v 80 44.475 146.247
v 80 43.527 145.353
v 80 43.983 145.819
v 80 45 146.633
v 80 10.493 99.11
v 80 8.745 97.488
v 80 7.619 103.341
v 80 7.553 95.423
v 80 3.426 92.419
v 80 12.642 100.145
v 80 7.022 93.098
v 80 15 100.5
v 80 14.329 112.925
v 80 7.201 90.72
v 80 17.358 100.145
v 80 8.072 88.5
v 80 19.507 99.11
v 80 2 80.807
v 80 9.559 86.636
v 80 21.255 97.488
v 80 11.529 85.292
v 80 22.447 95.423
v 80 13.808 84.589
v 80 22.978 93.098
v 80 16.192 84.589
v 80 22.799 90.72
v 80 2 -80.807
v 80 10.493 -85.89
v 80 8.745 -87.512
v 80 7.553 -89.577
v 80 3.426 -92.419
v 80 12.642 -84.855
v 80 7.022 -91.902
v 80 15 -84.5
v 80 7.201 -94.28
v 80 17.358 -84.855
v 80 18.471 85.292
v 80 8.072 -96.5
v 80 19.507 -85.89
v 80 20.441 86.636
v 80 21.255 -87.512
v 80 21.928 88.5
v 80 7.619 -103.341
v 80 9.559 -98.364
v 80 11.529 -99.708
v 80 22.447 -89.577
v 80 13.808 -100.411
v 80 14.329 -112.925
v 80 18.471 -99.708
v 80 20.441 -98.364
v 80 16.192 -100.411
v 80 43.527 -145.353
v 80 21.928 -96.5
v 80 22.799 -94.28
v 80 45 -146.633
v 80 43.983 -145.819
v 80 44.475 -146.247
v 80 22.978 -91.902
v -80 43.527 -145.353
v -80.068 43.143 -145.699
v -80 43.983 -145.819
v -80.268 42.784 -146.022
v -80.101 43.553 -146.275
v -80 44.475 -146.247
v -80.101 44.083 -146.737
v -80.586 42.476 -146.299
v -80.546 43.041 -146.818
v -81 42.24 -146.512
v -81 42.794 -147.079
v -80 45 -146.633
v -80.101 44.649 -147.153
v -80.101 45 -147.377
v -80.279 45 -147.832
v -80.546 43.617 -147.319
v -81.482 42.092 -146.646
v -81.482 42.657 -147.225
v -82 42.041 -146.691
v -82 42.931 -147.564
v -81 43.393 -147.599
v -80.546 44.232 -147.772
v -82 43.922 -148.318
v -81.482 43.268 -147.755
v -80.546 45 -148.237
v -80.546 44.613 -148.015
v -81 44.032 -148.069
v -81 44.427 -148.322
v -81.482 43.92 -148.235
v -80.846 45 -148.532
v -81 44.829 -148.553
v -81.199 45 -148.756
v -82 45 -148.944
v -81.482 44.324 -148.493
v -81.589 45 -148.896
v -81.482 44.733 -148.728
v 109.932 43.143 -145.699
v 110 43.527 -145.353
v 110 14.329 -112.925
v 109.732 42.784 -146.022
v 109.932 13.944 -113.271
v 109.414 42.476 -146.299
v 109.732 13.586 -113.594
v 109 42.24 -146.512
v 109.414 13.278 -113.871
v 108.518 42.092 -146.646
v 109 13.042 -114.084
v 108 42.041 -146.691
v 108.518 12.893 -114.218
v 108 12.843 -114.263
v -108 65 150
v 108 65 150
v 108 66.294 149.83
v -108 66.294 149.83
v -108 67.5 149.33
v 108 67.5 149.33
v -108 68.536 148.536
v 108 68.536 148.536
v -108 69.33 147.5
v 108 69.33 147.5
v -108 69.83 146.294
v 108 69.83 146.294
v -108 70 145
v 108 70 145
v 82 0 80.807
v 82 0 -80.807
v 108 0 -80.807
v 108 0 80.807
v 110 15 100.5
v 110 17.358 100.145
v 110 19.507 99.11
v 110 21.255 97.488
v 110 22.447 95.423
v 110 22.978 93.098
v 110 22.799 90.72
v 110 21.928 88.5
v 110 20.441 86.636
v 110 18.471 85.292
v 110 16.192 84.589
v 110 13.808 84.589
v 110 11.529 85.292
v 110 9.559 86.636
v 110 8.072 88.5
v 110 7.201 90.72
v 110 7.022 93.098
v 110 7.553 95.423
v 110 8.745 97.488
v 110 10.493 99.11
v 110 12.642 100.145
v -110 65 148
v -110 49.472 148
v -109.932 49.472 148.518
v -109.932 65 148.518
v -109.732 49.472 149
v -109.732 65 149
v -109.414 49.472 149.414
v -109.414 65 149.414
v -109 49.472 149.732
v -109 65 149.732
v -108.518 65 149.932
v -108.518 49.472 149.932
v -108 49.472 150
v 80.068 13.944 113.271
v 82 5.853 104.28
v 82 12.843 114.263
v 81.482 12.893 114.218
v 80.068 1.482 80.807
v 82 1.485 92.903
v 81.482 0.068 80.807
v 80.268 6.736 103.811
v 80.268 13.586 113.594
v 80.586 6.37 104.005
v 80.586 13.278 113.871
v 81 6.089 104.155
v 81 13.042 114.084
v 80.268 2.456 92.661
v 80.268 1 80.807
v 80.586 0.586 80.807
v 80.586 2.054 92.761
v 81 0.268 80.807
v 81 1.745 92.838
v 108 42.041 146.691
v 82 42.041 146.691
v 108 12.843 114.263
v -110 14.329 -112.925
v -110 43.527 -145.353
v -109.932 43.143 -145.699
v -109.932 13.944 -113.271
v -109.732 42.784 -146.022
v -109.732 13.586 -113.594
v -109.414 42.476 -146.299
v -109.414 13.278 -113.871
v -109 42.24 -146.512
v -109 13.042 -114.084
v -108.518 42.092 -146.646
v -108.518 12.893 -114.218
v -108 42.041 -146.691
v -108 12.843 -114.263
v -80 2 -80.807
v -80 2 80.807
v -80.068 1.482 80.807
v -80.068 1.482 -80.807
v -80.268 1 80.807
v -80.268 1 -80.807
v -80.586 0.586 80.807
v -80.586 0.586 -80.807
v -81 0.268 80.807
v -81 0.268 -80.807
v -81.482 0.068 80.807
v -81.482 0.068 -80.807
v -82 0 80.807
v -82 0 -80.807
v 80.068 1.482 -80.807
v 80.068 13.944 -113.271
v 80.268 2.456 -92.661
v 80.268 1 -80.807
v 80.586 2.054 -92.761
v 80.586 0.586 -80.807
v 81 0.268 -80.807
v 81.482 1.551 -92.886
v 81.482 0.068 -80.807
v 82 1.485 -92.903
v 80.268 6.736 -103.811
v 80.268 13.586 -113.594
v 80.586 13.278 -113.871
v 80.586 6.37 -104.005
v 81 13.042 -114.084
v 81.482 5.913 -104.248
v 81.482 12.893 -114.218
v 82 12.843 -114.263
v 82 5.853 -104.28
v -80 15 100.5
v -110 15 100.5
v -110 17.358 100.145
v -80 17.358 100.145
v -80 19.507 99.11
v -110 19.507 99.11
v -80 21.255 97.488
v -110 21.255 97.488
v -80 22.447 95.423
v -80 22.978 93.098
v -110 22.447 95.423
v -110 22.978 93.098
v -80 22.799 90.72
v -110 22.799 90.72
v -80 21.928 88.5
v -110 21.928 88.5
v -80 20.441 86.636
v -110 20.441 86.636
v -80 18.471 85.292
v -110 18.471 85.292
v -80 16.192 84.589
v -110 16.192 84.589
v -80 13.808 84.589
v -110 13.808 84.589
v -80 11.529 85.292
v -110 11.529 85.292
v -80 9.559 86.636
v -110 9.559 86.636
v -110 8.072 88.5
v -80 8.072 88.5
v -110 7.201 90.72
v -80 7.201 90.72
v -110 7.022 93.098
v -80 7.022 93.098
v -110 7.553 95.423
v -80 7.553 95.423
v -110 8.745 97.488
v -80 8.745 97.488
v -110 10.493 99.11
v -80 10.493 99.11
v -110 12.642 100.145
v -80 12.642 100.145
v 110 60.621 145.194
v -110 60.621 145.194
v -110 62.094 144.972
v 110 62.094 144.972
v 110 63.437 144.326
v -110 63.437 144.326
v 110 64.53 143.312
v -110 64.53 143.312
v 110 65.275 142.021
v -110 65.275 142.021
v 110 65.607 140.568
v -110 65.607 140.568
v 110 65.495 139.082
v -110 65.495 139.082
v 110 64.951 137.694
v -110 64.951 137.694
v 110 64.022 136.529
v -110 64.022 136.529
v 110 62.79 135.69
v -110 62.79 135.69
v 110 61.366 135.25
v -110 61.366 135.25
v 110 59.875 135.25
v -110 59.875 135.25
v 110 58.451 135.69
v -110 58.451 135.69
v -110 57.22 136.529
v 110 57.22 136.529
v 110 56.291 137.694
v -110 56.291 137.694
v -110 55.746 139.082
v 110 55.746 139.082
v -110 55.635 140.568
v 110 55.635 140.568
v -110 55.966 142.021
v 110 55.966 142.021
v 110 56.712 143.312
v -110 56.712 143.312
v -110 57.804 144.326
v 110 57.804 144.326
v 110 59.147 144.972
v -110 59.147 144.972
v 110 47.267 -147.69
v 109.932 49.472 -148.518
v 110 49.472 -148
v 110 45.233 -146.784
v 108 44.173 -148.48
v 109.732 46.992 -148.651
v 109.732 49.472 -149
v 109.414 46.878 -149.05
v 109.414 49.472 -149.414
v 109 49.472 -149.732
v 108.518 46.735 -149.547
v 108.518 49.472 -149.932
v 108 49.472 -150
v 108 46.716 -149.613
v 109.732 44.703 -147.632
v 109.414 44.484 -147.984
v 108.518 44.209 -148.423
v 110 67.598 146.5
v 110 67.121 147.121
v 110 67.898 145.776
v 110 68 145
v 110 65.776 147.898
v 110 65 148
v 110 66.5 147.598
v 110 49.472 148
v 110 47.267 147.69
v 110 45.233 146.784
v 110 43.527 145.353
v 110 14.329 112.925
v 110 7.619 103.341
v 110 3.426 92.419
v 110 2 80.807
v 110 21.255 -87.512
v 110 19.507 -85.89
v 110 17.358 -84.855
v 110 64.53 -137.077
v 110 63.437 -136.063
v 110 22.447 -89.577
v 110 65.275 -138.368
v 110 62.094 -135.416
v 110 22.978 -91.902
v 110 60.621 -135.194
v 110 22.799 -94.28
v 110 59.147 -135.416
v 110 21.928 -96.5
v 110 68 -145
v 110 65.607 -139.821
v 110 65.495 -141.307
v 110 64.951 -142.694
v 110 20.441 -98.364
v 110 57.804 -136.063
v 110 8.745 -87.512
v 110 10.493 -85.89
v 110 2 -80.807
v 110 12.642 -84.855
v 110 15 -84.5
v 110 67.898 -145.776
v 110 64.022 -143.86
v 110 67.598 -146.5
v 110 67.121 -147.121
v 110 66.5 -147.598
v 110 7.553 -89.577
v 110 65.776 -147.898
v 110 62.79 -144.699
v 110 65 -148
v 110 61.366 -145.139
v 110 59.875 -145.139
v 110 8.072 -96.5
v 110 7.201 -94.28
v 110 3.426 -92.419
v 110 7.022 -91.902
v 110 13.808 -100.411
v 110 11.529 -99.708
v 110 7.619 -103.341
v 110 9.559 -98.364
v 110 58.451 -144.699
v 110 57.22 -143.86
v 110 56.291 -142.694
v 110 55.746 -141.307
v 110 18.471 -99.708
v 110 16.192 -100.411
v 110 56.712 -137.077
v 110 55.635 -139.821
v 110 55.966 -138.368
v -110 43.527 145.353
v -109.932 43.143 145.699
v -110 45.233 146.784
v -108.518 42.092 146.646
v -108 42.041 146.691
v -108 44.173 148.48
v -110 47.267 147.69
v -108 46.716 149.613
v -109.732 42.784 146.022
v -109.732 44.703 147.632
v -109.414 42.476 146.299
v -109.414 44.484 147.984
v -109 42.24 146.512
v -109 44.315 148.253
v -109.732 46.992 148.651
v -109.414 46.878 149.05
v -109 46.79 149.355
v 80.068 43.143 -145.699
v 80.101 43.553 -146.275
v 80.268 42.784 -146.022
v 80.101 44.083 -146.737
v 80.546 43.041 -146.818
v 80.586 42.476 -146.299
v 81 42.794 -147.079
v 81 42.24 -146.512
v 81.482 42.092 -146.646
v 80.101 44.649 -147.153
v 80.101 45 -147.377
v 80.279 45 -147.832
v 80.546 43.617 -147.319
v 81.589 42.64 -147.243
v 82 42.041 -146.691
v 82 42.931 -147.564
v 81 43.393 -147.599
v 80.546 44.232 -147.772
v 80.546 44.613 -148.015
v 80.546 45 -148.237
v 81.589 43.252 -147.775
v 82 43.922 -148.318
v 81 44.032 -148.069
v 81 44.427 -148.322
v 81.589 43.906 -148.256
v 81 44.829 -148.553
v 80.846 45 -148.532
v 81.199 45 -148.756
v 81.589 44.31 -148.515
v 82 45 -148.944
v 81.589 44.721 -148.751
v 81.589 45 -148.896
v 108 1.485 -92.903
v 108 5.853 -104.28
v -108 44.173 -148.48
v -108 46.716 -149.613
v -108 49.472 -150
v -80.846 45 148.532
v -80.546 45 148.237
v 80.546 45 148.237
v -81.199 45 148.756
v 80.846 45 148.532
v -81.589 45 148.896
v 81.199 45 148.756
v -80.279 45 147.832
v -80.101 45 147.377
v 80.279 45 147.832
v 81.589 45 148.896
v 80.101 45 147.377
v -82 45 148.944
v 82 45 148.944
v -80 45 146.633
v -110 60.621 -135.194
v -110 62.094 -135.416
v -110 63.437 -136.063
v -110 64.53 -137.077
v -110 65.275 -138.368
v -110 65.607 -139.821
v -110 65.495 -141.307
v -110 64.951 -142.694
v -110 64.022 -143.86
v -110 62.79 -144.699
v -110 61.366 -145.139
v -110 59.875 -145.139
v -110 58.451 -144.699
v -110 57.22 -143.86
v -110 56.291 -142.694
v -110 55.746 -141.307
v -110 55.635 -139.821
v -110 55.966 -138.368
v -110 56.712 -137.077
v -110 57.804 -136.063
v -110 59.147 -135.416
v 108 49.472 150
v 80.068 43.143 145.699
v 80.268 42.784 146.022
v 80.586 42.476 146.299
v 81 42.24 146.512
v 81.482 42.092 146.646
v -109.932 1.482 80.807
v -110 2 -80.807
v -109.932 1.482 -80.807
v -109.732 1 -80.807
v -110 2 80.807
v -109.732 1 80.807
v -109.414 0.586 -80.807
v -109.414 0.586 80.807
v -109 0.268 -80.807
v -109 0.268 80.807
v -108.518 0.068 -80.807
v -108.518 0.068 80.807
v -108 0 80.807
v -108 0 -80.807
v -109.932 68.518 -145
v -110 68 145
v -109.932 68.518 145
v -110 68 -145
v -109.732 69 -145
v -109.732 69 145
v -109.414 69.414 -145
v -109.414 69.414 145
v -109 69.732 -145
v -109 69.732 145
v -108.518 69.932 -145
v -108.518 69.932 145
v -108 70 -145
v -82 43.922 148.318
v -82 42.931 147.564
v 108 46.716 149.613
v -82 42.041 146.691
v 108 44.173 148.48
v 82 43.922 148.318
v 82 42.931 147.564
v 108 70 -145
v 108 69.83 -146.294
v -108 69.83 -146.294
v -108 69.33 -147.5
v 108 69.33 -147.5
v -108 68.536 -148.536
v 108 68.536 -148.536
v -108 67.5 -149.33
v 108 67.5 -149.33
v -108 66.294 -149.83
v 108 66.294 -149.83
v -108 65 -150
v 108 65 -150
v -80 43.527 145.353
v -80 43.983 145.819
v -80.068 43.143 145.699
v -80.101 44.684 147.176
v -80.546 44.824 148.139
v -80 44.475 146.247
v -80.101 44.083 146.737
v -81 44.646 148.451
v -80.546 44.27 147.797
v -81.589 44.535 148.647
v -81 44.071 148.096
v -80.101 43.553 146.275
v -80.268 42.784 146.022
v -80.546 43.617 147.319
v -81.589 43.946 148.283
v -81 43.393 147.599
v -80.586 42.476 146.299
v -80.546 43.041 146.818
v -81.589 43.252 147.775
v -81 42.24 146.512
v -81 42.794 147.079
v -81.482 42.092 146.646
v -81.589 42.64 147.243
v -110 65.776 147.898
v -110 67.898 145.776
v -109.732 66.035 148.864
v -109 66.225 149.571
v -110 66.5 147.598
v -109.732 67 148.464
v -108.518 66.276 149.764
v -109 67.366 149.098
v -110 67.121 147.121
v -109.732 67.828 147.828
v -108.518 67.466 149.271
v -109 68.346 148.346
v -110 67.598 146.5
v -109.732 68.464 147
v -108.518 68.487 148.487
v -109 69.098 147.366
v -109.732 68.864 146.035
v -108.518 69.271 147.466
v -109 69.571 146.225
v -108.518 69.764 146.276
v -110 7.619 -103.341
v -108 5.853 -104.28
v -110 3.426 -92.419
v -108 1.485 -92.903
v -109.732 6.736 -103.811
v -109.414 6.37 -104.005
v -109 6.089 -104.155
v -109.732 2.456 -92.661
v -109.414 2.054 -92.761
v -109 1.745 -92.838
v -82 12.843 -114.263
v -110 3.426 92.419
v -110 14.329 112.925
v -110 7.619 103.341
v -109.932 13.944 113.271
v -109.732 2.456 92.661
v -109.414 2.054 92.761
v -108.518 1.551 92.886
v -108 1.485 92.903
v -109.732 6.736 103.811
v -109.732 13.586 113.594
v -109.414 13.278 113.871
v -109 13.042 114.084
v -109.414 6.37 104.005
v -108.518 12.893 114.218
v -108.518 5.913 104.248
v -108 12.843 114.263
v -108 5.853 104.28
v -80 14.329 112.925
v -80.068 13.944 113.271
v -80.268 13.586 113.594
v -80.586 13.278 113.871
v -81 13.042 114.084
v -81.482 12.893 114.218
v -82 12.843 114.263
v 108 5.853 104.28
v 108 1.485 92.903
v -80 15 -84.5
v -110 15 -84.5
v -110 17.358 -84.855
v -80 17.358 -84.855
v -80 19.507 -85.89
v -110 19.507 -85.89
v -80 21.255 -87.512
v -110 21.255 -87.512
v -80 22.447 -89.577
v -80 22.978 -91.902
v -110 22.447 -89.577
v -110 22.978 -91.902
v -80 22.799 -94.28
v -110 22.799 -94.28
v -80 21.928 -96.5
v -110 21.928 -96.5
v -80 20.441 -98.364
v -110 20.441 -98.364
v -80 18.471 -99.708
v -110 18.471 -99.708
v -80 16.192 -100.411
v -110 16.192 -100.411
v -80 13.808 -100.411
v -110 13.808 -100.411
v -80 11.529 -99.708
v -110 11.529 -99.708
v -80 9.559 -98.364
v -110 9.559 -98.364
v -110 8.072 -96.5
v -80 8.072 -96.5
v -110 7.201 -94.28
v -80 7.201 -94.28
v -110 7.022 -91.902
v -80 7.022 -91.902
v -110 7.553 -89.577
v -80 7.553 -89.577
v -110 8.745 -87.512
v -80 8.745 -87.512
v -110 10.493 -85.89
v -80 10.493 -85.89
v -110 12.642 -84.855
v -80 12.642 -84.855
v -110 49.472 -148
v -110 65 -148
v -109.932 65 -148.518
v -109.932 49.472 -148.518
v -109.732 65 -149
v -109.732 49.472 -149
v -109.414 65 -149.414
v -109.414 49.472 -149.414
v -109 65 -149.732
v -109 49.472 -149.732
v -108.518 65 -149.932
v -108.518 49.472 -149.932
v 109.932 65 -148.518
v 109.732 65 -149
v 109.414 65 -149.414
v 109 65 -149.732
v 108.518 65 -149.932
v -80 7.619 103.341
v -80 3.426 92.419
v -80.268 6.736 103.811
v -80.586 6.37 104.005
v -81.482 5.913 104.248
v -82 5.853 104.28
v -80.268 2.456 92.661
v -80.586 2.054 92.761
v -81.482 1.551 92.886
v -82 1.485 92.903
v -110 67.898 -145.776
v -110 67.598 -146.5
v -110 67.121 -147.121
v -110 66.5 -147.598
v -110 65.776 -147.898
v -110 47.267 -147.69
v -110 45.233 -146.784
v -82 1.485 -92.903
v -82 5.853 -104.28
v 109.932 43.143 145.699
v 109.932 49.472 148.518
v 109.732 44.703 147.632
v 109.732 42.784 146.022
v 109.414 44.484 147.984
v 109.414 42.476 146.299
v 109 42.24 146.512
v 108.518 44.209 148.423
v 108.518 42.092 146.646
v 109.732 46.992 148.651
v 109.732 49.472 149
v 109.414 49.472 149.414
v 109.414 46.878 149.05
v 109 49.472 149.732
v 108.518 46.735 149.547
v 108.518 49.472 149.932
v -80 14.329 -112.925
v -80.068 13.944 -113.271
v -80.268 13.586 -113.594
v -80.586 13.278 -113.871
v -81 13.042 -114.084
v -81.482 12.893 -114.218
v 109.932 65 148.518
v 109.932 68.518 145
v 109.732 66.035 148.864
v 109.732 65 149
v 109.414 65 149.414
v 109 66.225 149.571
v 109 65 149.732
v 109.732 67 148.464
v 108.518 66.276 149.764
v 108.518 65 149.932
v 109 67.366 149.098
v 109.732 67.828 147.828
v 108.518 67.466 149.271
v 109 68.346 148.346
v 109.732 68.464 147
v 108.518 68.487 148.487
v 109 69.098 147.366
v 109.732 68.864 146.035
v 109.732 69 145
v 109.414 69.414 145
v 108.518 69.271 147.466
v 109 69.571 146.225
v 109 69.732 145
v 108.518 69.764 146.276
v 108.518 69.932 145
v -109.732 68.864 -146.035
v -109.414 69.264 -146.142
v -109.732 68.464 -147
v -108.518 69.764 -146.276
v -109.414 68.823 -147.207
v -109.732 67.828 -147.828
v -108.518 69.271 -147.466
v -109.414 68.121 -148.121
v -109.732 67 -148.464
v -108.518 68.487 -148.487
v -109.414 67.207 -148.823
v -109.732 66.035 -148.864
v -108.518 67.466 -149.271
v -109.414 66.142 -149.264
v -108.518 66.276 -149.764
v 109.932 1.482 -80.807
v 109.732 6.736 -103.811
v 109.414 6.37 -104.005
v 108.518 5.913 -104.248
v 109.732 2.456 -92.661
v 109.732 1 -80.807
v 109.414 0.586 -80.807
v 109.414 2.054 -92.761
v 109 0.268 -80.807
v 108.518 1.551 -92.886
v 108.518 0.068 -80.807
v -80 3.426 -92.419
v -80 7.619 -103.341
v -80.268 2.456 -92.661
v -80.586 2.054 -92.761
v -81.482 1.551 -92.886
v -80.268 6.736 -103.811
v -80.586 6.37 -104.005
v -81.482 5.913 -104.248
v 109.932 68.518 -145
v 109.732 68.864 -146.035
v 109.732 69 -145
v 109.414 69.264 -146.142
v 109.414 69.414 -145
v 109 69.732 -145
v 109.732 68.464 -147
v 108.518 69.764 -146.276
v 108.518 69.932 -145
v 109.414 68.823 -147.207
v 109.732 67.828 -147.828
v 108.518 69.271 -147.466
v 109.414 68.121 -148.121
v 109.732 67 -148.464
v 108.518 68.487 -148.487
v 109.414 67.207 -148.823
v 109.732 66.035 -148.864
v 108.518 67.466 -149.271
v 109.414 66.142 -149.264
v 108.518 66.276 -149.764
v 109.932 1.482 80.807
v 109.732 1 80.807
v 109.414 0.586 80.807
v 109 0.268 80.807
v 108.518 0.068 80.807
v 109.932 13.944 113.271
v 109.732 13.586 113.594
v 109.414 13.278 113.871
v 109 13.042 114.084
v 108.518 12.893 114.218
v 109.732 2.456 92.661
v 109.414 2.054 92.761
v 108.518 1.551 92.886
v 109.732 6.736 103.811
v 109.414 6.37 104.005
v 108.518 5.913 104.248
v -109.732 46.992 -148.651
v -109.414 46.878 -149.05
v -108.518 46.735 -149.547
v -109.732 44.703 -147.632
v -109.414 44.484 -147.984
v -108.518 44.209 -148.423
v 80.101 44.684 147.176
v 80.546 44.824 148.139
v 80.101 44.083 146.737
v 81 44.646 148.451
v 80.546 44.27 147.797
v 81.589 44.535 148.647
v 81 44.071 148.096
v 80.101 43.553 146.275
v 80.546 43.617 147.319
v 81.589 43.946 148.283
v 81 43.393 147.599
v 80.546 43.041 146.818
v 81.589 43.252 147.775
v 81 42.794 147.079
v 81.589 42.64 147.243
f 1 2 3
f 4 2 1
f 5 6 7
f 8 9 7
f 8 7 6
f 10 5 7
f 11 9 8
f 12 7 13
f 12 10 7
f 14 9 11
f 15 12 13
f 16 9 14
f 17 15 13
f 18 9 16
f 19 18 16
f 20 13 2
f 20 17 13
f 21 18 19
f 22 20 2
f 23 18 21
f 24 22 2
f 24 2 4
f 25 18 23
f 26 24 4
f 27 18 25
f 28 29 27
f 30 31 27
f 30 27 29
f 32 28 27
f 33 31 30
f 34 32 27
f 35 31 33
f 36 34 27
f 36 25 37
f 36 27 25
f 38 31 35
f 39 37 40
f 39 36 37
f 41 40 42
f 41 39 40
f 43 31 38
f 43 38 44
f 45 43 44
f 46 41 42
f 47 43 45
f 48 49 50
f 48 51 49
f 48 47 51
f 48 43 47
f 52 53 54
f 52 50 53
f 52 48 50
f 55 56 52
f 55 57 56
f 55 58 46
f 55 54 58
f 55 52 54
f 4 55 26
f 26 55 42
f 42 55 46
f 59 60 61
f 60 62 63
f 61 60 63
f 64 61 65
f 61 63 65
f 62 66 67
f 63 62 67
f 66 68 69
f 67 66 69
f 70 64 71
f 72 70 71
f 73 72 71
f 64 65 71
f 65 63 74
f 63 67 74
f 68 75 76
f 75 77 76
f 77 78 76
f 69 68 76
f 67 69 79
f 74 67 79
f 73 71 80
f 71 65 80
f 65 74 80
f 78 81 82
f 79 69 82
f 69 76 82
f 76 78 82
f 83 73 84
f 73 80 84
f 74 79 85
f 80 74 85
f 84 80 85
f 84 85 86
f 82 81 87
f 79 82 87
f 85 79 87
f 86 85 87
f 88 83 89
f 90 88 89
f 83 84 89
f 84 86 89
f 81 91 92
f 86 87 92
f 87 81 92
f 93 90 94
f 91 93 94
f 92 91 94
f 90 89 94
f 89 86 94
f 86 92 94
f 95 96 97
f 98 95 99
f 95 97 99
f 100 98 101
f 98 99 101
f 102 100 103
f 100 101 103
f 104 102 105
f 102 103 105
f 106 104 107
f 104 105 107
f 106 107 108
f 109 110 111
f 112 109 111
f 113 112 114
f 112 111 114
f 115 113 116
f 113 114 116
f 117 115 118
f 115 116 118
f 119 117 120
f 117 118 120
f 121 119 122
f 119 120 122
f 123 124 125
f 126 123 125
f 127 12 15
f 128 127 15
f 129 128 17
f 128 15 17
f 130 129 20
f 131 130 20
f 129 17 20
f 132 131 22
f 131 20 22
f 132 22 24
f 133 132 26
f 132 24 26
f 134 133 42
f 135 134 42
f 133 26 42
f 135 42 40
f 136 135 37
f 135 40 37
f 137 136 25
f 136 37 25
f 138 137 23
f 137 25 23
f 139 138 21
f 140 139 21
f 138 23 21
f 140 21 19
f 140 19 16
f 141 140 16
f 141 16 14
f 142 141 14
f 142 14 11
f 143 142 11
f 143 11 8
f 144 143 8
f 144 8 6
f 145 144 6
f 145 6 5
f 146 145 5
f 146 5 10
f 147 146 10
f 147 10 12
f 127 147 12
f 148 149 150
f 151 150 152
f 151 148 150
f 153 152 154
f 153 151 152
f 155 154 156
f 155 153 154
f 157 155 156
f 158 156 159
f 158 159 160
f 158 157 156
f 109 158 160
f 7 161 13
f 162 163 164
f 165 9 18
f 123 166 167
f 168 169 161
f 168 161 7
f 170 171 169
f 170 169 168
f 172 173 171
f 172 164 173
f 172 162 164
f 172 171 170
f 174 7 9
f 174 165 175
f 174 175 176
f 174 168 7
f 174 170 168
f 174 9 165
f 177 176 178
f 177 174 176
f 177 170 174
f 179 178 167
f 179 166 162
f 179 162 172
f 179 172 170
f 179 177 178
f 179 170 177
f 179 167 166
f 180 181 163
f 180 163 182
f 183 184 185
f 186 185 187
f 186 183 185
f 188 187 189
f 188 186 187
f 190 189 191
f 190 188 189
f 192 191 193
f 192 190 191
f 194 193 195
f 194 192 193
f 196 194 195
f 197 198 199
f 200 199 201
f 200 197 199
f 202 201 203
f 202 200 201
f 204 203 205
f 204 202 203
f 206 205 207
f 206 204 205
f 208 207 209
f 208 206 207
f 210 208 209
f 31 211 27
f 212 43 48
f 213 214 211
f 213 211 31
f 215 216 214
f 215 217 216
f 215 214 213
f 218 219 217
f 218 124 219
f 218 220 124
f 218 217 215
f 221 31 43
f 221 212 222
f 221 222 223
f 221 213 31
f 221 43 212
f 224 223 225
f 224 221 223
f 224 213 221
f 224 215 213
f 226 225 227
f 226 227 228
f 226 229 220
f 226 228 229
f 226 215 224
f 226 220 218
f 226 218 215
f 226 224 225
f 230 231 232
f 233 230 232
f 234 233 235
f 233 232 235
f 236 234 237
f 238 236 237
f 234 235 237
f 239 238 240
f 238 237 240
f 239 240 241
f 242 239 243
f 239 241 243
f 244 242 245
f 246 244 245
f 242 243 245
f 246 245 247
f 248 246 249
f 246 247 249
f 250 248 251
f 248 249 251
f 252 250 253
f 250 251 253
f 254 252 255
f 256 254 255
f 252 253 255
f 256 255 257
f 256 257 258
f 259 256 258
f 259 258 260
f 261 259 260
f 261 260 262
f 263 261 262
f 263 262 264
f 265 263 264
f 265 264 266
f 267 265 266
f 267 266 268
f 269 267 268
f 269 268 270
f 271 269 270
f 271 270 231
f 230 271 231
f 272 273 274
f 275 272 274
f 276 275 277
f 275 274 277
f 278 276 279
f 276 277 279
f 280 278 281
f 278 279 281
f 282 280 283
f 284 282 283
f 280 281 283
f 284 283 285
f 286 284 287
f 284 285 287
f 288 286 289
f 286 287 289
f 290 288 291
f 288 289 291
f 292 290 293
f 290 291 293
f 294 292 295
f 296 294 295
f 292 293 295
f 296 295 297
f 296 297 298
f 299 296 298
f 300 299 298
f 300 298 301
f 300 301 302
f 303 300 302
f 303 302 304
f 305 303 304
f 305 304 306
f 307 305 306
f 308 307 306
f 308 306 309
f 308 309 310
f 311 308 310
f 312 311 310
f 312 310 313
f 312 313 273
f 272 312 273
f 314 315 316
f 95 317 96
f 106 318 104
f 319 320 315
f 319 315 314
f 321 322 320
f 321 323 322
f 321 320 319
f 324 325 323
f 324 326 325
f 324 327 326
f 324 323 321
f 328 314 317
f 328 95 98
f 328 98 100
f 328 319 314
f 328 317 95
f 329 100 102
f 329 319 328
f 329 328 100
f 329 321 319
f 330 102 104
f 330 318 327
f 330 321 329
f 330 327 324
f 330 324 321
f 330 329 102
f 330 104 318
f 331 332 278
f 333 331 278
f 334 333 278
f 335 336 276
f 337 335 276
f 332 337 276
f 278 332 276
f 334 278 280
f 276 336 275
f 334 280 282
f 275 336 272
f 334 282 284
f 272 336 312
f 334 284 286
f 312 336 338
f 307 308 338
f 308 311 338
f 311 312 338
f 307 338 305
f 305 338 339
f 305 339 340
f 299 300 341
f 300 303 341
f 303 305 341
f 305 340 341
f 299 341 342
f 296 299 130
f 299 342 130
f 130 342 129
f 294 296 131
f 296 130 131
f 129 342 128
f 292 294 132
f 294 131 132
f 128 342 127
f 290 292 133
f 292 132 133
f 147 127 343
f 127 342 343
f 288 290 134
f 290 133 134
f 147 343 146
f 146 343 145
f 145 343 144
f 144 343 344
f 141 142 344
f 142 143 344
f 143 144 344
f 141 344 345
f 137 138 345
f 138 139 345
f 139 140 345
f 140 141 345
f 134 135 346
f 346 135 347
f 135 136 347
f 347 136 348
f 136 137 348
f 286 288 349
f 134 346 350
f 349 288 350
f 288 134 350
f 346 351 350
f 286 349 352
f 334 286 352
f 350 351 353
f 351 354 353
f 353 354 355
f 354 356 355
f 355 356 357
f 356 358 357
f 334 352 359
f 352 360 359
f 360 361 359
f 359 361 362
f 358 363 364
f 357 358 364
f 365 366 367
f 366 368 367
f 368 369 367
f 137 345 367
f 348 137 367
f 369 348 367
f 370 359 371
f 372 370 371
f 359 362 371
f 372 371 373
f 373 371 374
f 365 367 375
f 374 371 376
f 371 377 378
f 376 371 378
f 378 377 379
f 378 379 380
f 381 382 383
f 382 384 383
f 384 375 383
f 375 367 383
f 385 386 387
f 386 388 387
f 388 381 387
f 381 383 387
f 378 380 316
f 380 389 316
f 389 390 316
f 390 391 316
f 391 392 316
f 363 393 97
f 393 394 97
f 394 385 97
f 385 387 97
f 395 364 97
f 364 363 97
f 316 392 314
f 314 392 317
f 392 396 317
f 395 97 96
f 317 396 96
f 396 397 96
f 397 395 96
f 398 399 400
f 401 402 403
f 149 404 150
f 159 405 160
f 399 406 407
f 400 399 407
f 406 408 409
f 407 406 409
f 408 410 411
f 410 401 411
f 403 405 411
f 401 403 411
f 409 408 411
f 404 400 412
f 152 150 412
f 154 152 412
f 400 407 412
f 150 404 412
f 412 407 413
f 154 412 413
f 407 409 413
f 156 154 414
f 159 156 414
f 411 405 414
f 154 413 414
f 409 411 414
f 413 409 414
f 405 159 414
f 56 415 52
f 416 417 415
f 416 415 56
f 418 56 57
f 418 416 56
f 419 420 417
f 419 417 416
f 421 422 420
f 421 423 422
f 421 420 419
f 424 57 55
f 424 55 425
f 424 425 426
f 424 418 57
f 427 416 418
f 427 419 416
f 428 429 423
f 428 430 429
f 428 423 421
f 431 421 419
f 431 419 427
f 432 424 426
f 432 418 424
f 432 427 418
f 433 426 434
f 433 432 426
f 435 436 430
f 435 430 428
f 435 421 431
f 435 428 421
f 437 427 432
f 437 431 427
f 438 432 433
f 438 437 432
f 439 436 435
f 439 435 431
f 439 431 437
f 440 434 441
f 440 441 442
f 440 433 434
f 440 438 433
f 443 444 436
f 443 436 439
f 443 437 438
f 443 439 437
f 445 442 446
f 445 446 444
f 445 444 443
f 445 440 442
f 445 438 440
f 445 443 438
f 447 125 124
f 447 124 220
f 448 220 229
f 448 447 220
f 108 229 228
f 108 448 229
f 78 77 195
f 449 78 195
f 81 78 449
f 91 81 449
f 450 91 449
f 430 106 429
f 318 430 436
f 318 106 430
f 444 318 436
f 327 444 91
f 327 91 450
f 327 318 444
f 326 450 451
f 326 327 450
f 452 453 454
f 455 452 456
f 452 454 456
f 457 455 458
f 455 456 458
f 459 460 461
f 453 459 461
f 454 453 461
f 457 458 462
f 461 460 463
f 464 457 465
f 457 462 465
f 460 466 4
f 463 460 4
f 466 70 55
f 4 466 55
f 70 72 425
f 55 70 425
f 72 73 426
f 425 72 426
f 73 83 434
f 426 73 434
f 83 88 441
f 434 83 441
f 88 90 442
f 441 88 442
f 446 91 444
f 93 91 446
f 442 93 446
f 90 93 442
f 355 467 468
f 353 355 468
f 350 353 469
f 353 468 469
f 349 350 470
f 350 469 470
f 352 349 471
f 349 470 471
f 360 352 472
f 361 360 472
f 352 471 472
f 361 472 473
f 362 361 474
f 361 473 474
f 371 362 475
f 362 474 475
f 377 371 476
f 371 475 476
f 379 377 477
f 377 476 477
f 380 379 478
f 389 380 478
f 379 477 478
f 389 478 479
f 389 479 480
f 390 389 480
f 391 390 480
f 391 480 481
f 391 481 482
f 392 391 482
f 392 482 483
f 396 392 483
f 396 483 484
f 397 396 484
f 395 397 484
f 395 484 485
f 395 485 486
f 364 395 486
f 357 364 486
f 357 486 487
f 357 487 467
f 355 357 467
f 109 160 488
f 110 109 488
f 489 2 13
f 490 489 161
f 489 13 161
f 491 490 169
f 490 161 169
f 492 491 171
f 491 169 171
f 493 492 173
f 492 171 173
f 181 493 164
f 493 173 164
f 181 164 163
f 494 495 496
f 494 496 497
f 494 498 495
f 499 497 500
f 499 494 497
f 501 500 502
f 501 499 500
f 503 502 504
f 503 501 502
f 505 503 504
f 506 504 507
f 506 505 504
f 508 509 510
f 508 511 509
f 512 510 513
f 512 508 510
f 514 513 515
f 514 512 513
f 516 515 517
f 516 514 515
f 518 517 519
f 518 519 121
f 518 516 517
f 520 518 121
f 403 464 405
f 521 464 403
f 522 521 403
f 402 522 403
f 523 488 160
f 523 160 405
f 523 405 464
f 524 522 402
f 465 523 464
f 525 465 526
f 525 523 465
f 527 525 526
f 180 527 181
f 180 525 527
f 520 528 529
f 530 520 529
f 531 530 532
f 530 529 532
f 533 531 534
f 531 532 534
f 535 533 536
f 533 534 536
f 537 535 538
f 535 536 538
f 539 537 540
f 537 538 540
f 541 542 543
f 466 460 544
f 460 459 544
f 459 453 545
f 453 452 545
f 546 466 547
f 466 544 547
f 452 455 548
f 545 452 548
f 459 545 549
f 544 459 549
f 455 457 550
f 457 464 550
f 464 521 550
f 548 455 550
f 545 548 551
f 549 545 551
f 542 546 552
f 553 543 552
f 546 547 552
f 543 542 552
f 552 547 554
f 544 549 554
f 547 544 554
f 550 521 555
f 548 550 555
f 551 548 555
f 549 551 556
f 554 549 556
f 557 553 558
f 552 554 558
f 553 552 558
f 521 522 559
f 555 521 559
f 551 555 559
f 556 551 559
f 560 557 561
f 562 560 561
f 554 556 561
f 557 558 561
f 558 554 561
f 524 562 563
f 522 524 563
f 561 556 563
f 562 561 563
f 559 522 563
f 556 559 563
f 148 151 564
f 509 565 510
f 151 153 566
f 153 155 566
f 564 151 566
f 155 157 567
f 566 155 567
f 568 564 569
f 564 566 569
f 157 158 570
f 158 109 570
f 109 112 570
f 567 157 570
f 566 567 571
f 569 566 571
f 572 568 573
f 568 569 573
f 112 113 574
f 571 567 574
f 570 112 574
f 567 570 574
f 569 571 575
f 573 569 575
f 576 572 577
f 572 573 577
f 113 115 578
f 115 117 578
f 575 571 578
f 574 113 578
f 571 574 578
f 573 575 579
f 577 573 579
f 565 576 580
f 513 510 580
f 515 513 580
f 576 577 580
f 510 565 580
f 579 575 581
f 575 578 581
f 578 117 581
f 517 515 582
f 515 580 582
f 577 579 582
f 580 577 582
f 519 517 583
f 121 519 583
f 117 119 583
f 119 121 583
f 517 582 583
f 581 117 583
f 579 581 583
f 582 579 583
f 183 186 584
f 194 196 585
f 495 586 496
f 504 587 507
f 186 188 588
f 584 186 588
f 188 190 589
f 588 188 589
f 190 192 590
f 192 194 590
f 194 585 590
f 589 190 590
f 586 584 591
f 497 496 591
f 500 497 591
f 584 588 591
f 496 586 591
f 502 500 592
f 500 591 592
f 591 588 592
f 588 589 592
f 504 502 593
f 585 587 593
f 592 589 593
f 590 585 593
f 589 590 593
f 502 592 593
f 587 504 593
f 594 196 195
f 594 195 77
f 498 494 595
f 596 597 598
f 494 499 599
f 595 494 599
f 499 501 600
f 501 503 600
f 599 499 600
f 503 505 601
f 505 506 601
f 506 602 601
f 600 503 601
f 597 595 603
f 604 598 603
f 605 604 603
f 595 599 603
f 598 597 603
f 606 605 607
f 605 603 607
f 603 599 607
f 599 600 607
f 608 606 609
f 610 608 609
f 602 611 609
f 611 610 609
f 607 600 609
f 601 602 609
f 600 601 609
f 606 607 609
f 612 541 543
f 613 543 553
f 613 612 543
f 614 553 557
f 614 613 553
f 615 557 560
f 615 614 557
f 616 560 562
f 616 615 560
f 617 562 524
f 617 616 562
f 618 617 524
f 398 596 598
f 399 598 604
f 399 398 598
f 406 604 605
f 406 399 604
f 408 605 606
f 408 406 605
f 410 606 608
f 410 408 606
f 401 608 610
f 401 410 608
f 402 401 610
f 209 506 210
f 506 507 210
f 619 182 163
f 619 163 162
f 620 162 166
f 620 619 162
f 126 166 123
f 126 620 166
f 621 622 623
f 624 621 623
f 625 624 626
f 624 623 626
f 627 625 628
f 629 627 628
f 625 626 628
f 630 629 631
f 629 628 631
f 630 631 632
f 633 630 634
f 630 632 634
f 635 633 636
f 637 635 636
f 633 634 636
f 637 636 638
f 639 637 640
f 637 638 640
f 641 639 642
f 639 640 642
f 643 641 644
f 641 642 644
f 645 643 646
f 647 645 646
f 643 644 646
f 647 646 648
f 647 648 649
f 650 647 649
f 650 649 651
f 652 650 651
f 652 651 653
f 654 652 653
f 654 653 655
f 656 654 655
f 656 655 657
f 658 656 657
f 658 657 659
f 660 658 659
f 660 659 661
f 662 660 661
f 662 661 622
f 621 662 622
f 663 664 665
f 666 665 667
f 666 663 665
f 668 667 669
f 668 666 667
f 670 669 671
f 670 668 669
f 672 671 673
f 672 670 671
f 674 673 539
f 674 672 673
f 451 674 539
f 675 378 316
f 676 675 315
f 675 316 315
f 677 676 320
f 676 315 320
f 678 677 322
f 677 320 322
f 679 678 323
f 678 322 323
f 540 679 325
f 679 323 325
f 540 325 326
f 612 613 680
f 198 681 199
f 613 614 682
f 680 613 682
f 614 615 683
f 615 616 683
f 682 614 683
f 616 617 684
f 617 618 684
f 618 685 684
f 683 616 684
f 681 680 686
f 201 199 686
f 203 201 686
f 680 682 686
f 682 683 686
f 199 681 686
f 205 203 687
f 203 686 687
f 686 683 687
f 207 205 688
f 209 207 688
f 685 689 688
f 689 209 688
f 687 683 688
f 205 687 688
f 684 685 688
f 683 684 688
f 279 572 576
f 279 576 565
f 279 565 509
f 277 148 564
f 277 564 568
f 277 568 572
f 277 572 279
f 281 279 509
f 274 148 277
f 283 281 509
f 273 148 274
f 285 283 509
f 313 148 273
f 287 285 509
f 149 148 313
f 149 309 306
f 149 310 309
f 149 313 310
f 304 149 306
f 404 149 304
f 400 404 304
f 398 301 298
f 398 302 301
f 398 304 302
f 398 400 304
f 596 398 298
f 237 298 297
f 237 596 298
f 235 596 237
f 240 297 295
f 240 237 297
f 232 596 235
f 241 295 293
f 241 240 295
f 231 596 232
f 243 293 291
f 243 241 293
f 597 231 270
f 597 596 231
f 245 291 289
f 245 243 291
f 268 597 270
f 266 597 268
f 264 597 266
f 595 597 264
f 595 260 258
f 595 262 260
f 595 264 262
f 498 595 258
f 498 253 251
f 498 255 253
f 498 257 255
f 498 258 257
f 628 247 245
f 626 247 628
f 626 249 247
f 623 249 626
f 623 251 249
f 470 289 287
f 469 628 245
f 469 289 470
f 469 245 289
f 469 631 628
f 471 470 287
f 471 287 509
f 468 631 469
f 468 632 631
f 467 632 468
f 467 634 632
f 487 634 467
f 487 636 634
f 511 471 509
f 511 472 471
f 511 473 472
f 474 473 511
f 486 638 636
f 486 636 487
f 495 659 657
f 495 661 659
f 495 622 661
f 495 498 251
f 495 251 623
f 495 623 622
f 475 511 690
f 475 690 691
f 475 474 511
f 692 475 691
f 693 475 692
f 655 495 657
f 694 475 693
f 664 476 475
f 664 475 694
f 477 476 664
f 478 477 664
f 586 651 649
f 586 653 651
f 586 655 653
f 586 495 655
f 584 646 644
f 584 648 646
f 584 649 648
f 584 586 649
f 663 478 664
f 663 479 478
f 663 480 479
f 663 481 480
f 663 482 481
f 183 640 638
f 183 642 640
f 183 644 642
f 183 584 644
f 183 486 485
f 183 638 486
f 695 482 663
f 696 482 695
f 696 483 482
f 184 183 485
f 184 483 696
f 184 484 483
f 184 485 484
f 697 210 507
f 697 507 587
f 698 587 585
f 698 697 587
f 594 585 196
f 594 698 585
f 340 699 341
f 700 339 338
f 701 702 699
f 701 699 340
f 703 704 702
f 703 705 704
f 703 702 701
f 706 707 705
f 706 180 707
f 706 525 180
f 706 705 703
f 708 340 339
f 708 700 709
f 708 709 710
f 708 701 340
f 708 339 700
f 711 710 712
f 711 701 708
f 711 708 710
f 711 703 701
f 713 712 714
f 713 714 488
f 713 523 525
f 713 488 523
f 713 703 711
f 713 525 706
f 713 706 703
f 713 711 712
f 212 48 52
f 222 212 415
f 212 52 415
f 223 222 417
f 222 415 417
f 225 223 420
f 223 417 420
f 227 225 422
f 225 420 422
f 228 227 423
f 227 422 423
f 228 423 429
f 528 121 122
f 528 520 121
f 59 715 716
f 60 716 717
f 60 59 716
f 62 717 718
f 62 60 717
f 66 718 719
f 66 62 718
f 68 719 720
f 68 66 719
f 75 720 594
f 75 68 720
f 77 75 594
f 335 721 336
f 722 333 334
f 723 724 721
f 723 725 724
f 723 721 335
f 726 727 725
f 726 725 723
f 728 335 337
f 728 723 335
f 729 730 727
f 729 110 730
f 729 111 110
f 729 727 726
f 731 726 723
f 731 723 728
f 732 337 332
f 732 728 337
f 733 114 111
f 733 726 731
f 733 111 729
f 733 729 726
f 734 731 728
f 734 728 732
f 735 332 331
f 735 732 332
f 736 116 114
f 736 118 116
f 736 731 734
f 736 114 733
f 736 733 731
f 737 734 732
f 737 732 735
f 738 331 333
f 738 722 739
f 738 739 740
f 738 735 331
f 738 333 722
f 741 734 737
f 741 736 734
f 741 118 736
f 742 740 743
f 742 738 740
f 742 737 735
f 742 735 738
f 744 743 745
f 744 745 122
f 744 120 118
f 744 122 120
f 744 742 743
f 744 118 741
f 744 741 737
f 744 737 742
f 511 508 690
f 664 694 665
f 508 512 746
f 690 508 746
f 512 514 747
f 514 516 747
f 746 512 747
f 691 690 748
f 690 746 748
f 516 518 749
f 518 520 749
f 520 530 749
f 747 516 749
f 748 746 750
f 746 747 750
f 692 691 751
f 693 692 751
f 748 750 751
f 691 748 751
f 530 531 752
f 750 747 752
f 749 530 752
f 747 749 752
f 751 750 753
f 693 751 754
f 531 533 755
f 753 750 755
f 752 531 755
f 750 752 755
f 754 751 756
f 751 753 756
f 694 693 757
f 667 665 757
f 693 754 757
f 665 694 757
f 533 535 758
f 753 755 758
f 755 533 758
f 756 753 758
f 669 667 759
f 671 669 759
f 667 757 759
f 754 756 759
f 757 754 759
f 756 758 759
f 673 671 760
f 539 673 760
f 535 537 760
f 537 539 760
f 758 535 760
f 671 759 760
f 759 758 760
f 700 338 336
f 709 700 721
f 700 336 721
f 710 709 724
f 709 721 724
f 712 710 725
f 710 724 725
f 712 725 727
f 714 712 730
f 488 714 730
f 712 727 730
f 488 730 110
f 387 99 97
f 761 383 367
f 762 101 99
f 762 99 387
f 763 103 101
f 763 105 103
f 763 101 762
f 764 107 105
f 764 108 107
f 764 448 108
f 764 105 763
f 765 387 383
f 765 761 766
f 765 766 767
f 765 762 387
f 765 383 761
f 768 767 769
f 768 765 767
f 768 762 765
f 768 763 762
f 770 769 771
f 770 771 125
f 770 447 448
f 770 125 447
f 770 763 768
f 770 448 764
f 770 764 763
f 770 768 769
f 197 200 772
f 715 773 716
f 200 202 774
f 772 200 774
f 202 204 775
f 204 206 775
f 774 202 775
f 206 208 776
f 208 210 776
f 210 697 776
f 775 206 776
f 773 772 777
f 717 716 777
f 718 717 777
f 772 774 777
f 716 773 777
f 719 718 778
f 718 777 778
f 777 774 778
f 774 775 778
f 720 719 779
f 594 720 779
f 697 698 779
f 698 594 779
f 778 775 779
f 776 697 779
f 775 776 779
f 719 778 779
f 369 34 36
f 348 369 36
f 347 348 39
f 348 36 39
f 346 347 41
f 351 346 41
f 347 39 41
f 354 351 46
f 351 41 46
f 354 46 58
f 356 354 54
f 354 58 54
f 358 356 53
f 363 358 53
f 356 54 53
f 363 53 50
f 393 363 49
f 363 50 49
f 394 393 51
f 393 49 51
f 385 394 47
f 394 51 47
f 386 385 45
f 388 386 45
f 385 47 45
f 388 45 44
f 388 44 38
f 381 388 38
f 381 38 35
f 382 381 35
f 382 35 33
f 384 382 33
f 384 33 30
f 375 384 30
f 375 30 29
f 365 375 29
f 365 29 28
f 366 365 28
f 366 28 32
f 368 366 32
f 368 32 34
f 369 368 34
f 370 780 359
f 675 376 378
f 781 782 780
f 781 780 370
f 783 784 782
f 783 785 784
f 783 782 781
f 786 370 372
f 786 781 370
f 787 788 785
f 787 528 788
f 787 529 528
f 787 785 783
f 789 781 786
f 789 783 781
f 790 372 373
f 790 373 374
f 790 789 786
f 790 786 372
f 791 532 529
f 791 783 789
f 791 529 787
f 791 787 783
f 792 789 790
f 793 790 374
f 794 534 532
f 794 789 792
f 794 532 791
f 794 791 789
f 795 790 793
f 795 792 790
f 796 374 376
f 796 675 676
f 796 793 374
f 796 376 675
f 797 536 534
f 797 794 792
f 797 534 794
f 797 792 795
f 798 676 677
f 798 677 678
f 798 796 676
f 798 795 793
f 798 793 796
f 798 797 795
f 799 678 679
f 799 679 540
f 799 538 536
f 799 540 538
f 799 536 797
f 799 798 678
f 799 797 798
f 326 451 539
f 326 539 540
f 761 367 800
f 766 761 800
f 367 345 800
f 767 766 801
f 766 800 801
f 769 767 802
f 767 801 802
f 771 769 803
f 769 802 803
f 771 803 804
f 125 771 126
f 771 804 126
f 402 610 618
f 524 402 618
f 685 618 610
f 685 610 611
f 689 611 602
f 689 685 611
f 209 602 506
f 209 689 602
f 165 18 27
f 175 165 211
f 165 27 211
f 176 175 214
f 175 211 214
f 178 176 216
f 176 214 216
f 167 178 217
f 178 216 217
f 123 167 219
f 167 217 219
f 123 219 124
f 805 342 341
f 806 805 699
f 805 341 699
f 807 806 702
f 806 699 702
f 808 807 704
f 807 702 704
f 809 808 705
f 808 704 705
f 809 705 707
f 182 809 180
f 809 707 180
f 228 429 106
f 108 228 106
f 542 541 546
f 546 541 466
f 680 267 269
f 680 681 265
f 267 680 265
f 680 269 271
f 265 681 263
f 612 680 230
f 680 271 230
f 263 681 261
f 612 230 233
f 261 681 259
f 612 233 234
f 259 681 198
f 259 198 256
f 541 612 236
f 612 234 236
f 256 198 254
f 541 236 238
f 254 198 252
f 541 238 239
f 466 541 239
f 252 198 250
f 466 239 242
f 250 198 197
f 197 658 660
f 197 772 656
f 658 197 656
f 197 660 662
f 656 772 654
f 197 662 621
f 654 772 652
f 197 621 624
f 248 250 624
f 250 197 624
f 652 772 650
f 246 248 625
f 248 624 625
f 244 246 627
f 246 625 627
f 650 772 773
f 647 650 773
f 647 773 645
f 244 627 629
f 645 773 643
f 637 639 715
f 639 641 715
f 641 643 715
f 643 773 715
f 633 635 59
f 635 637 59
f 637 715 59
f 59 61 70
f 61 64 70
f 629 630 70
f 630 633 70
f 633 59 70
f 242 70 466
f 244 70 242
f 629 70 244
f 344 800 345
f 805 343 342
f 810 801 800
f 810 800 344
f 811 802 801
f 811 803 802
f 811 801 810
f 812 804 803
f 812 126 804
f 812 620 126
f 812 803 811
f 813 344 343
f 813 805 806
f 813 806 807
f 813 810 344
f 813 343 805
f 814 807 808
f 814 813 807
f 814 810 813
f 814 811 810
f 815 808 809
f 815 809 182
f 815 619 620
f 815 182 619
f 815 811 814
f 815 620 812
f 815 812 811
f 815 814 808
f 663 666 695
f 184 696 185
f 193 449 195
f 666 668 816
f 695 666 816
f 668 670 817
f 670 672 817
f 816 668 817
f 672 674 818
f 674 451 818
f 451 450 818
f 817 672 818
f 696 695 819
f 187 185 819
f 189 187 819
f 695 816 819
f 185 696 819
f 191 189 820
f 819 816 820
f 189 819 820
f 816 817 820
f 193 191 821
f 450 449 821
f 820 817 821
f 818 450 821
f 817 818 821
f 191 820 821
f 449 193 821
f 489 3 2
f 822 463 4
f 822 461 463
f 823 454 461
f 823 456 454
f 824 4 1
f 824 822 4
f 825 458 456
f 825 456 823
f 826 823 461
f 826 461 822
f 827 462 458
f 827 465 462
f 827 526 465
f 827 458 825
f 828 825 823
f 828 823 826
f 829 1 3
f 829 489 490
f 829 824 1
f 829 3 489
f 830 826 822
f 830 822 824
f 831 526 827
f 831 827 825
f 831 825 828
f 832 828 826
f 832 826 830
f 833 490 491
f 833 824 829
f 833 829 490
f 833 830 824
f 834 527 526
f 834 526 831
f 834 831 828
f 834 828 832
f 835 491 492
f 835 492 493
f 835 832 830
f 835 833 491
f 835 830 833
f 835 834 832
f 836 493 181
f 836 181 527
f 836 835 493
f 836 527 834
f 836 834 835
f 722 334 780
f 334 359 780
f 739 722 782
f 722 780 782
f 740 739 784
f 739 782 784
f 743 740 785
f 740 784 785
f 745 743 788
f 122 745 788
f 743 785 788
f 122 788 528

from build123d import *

# Parameters (mm, degrees)
SKETCH1_W               = 220
SKETCH1_H               = 300
BOSS_EXTRUDE1_DEPTH     = 70
SKETCH2_R               = 5
SKETCH2_R_2             = 8
CUT_EXTRUDE1_DEPTH      = 221
CHAMFER1_SIZE           = 50
CHAMFER1_SIZE2          = 45.020202215
FILLET1_R               = 5
FILLET2_R               = 10
FILLET3_R               = 50
SKETCH3_W               = 160
SKETCH3_H               = 45
CUT_EXTRUDE2_DEPTH      = 151
CUT_EXTRUDE2_DEPTH_BACK = 151
FILLET4_R               = 2
FILLET5_R               = 2


with BuildPart() as part:
    # Sketch1 → Boss-Extrude1 (new body)
    with BuildSketch(Plane(origin=(0, 0, 0), x_dir=(1, 0, 0), z_dir=(0, 1, 0))):
        Rectangle(SKETCH1_W, SKETCH1_H)
    extrude(amount=BOSS_EXTRUDE1_DEPTH)

    # Sketch2 → Cut-Extrude1 (cut, through all)
    with BuildSketch(Plane.ZY.offset(110)):
        with Locations((-140.194362572, 60.620694634)):
            Circle(SKETCH2_R)
        with Locations((-92.5, 15)):
            Circle(SKETCH2_R_2)
        with Locations((92.5, 15)):
            Circle(SKETCH2_R_2)
        with Locations((140.194362572, 60.620694634)):
            Circle(SKETCH2_R)
    extrude(amount=-CUT_EXTRUDE1_DEPTH, mode=Mode.SUBTRACT)

    # Chamfer1
    chamfer1_edges = [part.edges().sort_by_distance(p)[0] for p in [
        (0, 0, -150),
        (0, 0, 150),
    ]]
    chamfer1_side = [part.faces().sort_by_distance(p)[0] for p in [
        (0, 0, 0),
    ]]
    chamfer(chamfer1_edges, length=CHAMFER1_SIZE, length2=CHAMFER1_SIZE2, reference=chamfer1_side[0])

    # Fillet1
    fillet1_edges = [part.edges().sort_by_distance(p)[0] for p in [
        (0, 70, -150),
        (0, 70, 150),
    ]]
    fillet(fillet1_edges, radius=FILLET1_R)

    # Fillet2
    fillet2_edges = [part.edges().sort_by_distance(p)[0] for p in [
        (0, 45.020202215, 150),
        (0, 45.020202215, -150),
    ]]
    fillet(fillet2_edges, radius=FILLET2_R)

    # Fillet3
    fillet3_edges = [part.edges().sort_by_distance(p)[0] for p in [
        (0, 0, -100),
        (0, 0, 100),
    ]]
    fillet(fillet3_edges, radius=FILLET3_R)

    # Sketch3 → Cut-Extrude2 (cut, two sides)
    with BuildSketch(Plane.XY) as cut_extrude2_sk:
        with Locations((0, 22.5)):
            Rectangle(SKETCH3_W, SKETCH3_H)
    extrude(amount=CUT_EXTRUDE2_DEPTH, mode=Mode.SUBTRACT)
    extrude(cut_extrude2_sk.sketch, amount=-CUT_EXTRUDE2_DEPTH_BACK, mode=Mode.SUBTRACT)

    # Fillet4
    fillet4_edges = [part.edges().sort_by_distance(p)[0] for p in [
        (-80, 3.320978675, 98.725195725),
        (80, 3.320978675, 98.725195725),
        (80, 43.41487437, -147.956463044),
        (80, 27.44189977, -130.477317315),
        (80, 3.320978675, -98.725195725),
        (80, 27.44189977, 130.477317315),
        (80, 43.41487437, 147.956463044),
        (-80, 0, 0),
        (-80, 27.44189977, -130.477317315),
        (-80, 43.41487437, -147.956463044),
        (-80, 3.320978675, -98.725195725),
        (-80, 43.41487437, 147.956463044),
        (-80, 27.44189977, 130.477317315),
        (80, 0, 0),
    ]]
    fillet(fillet4_edges, radius=FILLET4_R)

    # Fillet5
    fillet5_edges = [part.edges().sort_by_distance(p)[0] for p in [
        (-110, 70, 0),
        (110, 70, 0),
        (-110, 57.236244534, 150),
        (-110, 57.236244534, -150),
        (-110, 68.535533906, 148.535533906),
        (-110, 68.535533906, -148.535533906),
        (110, 57.236244534, -150),
        (110, 57.236244534, 150),
        (110, 68.535533906, 148.535533906),
        (110, 68.535533906, -148.535533906),
        (-110, 27.44189977, -130.477317315),
        (-110, 45.405122637, 149.135454576),
        (-110, 45.405122637, -149.135454576),
        (110, 27.44189977, 130.477317315),
        (110, 45.405122637, 149.135454576),
        (110, 45.405122637, -149.135454576),
        (110, 0, 0),
        (-110, 0, 0),
        (110, 27.44189977, -130.477317315),
        (110, 3.320978675, 98.725195725),
        (110, 3.320978675, -98.725195725),
        (-110, 27.44189977, 130.477317315),
        (-110, 3.320978675, 98.725195725),
        (-110, 3.320978675, -98.725195725),
    ]]
    fillet(fillet5_edges, radius=FILLET5_R)


solid = part.part
